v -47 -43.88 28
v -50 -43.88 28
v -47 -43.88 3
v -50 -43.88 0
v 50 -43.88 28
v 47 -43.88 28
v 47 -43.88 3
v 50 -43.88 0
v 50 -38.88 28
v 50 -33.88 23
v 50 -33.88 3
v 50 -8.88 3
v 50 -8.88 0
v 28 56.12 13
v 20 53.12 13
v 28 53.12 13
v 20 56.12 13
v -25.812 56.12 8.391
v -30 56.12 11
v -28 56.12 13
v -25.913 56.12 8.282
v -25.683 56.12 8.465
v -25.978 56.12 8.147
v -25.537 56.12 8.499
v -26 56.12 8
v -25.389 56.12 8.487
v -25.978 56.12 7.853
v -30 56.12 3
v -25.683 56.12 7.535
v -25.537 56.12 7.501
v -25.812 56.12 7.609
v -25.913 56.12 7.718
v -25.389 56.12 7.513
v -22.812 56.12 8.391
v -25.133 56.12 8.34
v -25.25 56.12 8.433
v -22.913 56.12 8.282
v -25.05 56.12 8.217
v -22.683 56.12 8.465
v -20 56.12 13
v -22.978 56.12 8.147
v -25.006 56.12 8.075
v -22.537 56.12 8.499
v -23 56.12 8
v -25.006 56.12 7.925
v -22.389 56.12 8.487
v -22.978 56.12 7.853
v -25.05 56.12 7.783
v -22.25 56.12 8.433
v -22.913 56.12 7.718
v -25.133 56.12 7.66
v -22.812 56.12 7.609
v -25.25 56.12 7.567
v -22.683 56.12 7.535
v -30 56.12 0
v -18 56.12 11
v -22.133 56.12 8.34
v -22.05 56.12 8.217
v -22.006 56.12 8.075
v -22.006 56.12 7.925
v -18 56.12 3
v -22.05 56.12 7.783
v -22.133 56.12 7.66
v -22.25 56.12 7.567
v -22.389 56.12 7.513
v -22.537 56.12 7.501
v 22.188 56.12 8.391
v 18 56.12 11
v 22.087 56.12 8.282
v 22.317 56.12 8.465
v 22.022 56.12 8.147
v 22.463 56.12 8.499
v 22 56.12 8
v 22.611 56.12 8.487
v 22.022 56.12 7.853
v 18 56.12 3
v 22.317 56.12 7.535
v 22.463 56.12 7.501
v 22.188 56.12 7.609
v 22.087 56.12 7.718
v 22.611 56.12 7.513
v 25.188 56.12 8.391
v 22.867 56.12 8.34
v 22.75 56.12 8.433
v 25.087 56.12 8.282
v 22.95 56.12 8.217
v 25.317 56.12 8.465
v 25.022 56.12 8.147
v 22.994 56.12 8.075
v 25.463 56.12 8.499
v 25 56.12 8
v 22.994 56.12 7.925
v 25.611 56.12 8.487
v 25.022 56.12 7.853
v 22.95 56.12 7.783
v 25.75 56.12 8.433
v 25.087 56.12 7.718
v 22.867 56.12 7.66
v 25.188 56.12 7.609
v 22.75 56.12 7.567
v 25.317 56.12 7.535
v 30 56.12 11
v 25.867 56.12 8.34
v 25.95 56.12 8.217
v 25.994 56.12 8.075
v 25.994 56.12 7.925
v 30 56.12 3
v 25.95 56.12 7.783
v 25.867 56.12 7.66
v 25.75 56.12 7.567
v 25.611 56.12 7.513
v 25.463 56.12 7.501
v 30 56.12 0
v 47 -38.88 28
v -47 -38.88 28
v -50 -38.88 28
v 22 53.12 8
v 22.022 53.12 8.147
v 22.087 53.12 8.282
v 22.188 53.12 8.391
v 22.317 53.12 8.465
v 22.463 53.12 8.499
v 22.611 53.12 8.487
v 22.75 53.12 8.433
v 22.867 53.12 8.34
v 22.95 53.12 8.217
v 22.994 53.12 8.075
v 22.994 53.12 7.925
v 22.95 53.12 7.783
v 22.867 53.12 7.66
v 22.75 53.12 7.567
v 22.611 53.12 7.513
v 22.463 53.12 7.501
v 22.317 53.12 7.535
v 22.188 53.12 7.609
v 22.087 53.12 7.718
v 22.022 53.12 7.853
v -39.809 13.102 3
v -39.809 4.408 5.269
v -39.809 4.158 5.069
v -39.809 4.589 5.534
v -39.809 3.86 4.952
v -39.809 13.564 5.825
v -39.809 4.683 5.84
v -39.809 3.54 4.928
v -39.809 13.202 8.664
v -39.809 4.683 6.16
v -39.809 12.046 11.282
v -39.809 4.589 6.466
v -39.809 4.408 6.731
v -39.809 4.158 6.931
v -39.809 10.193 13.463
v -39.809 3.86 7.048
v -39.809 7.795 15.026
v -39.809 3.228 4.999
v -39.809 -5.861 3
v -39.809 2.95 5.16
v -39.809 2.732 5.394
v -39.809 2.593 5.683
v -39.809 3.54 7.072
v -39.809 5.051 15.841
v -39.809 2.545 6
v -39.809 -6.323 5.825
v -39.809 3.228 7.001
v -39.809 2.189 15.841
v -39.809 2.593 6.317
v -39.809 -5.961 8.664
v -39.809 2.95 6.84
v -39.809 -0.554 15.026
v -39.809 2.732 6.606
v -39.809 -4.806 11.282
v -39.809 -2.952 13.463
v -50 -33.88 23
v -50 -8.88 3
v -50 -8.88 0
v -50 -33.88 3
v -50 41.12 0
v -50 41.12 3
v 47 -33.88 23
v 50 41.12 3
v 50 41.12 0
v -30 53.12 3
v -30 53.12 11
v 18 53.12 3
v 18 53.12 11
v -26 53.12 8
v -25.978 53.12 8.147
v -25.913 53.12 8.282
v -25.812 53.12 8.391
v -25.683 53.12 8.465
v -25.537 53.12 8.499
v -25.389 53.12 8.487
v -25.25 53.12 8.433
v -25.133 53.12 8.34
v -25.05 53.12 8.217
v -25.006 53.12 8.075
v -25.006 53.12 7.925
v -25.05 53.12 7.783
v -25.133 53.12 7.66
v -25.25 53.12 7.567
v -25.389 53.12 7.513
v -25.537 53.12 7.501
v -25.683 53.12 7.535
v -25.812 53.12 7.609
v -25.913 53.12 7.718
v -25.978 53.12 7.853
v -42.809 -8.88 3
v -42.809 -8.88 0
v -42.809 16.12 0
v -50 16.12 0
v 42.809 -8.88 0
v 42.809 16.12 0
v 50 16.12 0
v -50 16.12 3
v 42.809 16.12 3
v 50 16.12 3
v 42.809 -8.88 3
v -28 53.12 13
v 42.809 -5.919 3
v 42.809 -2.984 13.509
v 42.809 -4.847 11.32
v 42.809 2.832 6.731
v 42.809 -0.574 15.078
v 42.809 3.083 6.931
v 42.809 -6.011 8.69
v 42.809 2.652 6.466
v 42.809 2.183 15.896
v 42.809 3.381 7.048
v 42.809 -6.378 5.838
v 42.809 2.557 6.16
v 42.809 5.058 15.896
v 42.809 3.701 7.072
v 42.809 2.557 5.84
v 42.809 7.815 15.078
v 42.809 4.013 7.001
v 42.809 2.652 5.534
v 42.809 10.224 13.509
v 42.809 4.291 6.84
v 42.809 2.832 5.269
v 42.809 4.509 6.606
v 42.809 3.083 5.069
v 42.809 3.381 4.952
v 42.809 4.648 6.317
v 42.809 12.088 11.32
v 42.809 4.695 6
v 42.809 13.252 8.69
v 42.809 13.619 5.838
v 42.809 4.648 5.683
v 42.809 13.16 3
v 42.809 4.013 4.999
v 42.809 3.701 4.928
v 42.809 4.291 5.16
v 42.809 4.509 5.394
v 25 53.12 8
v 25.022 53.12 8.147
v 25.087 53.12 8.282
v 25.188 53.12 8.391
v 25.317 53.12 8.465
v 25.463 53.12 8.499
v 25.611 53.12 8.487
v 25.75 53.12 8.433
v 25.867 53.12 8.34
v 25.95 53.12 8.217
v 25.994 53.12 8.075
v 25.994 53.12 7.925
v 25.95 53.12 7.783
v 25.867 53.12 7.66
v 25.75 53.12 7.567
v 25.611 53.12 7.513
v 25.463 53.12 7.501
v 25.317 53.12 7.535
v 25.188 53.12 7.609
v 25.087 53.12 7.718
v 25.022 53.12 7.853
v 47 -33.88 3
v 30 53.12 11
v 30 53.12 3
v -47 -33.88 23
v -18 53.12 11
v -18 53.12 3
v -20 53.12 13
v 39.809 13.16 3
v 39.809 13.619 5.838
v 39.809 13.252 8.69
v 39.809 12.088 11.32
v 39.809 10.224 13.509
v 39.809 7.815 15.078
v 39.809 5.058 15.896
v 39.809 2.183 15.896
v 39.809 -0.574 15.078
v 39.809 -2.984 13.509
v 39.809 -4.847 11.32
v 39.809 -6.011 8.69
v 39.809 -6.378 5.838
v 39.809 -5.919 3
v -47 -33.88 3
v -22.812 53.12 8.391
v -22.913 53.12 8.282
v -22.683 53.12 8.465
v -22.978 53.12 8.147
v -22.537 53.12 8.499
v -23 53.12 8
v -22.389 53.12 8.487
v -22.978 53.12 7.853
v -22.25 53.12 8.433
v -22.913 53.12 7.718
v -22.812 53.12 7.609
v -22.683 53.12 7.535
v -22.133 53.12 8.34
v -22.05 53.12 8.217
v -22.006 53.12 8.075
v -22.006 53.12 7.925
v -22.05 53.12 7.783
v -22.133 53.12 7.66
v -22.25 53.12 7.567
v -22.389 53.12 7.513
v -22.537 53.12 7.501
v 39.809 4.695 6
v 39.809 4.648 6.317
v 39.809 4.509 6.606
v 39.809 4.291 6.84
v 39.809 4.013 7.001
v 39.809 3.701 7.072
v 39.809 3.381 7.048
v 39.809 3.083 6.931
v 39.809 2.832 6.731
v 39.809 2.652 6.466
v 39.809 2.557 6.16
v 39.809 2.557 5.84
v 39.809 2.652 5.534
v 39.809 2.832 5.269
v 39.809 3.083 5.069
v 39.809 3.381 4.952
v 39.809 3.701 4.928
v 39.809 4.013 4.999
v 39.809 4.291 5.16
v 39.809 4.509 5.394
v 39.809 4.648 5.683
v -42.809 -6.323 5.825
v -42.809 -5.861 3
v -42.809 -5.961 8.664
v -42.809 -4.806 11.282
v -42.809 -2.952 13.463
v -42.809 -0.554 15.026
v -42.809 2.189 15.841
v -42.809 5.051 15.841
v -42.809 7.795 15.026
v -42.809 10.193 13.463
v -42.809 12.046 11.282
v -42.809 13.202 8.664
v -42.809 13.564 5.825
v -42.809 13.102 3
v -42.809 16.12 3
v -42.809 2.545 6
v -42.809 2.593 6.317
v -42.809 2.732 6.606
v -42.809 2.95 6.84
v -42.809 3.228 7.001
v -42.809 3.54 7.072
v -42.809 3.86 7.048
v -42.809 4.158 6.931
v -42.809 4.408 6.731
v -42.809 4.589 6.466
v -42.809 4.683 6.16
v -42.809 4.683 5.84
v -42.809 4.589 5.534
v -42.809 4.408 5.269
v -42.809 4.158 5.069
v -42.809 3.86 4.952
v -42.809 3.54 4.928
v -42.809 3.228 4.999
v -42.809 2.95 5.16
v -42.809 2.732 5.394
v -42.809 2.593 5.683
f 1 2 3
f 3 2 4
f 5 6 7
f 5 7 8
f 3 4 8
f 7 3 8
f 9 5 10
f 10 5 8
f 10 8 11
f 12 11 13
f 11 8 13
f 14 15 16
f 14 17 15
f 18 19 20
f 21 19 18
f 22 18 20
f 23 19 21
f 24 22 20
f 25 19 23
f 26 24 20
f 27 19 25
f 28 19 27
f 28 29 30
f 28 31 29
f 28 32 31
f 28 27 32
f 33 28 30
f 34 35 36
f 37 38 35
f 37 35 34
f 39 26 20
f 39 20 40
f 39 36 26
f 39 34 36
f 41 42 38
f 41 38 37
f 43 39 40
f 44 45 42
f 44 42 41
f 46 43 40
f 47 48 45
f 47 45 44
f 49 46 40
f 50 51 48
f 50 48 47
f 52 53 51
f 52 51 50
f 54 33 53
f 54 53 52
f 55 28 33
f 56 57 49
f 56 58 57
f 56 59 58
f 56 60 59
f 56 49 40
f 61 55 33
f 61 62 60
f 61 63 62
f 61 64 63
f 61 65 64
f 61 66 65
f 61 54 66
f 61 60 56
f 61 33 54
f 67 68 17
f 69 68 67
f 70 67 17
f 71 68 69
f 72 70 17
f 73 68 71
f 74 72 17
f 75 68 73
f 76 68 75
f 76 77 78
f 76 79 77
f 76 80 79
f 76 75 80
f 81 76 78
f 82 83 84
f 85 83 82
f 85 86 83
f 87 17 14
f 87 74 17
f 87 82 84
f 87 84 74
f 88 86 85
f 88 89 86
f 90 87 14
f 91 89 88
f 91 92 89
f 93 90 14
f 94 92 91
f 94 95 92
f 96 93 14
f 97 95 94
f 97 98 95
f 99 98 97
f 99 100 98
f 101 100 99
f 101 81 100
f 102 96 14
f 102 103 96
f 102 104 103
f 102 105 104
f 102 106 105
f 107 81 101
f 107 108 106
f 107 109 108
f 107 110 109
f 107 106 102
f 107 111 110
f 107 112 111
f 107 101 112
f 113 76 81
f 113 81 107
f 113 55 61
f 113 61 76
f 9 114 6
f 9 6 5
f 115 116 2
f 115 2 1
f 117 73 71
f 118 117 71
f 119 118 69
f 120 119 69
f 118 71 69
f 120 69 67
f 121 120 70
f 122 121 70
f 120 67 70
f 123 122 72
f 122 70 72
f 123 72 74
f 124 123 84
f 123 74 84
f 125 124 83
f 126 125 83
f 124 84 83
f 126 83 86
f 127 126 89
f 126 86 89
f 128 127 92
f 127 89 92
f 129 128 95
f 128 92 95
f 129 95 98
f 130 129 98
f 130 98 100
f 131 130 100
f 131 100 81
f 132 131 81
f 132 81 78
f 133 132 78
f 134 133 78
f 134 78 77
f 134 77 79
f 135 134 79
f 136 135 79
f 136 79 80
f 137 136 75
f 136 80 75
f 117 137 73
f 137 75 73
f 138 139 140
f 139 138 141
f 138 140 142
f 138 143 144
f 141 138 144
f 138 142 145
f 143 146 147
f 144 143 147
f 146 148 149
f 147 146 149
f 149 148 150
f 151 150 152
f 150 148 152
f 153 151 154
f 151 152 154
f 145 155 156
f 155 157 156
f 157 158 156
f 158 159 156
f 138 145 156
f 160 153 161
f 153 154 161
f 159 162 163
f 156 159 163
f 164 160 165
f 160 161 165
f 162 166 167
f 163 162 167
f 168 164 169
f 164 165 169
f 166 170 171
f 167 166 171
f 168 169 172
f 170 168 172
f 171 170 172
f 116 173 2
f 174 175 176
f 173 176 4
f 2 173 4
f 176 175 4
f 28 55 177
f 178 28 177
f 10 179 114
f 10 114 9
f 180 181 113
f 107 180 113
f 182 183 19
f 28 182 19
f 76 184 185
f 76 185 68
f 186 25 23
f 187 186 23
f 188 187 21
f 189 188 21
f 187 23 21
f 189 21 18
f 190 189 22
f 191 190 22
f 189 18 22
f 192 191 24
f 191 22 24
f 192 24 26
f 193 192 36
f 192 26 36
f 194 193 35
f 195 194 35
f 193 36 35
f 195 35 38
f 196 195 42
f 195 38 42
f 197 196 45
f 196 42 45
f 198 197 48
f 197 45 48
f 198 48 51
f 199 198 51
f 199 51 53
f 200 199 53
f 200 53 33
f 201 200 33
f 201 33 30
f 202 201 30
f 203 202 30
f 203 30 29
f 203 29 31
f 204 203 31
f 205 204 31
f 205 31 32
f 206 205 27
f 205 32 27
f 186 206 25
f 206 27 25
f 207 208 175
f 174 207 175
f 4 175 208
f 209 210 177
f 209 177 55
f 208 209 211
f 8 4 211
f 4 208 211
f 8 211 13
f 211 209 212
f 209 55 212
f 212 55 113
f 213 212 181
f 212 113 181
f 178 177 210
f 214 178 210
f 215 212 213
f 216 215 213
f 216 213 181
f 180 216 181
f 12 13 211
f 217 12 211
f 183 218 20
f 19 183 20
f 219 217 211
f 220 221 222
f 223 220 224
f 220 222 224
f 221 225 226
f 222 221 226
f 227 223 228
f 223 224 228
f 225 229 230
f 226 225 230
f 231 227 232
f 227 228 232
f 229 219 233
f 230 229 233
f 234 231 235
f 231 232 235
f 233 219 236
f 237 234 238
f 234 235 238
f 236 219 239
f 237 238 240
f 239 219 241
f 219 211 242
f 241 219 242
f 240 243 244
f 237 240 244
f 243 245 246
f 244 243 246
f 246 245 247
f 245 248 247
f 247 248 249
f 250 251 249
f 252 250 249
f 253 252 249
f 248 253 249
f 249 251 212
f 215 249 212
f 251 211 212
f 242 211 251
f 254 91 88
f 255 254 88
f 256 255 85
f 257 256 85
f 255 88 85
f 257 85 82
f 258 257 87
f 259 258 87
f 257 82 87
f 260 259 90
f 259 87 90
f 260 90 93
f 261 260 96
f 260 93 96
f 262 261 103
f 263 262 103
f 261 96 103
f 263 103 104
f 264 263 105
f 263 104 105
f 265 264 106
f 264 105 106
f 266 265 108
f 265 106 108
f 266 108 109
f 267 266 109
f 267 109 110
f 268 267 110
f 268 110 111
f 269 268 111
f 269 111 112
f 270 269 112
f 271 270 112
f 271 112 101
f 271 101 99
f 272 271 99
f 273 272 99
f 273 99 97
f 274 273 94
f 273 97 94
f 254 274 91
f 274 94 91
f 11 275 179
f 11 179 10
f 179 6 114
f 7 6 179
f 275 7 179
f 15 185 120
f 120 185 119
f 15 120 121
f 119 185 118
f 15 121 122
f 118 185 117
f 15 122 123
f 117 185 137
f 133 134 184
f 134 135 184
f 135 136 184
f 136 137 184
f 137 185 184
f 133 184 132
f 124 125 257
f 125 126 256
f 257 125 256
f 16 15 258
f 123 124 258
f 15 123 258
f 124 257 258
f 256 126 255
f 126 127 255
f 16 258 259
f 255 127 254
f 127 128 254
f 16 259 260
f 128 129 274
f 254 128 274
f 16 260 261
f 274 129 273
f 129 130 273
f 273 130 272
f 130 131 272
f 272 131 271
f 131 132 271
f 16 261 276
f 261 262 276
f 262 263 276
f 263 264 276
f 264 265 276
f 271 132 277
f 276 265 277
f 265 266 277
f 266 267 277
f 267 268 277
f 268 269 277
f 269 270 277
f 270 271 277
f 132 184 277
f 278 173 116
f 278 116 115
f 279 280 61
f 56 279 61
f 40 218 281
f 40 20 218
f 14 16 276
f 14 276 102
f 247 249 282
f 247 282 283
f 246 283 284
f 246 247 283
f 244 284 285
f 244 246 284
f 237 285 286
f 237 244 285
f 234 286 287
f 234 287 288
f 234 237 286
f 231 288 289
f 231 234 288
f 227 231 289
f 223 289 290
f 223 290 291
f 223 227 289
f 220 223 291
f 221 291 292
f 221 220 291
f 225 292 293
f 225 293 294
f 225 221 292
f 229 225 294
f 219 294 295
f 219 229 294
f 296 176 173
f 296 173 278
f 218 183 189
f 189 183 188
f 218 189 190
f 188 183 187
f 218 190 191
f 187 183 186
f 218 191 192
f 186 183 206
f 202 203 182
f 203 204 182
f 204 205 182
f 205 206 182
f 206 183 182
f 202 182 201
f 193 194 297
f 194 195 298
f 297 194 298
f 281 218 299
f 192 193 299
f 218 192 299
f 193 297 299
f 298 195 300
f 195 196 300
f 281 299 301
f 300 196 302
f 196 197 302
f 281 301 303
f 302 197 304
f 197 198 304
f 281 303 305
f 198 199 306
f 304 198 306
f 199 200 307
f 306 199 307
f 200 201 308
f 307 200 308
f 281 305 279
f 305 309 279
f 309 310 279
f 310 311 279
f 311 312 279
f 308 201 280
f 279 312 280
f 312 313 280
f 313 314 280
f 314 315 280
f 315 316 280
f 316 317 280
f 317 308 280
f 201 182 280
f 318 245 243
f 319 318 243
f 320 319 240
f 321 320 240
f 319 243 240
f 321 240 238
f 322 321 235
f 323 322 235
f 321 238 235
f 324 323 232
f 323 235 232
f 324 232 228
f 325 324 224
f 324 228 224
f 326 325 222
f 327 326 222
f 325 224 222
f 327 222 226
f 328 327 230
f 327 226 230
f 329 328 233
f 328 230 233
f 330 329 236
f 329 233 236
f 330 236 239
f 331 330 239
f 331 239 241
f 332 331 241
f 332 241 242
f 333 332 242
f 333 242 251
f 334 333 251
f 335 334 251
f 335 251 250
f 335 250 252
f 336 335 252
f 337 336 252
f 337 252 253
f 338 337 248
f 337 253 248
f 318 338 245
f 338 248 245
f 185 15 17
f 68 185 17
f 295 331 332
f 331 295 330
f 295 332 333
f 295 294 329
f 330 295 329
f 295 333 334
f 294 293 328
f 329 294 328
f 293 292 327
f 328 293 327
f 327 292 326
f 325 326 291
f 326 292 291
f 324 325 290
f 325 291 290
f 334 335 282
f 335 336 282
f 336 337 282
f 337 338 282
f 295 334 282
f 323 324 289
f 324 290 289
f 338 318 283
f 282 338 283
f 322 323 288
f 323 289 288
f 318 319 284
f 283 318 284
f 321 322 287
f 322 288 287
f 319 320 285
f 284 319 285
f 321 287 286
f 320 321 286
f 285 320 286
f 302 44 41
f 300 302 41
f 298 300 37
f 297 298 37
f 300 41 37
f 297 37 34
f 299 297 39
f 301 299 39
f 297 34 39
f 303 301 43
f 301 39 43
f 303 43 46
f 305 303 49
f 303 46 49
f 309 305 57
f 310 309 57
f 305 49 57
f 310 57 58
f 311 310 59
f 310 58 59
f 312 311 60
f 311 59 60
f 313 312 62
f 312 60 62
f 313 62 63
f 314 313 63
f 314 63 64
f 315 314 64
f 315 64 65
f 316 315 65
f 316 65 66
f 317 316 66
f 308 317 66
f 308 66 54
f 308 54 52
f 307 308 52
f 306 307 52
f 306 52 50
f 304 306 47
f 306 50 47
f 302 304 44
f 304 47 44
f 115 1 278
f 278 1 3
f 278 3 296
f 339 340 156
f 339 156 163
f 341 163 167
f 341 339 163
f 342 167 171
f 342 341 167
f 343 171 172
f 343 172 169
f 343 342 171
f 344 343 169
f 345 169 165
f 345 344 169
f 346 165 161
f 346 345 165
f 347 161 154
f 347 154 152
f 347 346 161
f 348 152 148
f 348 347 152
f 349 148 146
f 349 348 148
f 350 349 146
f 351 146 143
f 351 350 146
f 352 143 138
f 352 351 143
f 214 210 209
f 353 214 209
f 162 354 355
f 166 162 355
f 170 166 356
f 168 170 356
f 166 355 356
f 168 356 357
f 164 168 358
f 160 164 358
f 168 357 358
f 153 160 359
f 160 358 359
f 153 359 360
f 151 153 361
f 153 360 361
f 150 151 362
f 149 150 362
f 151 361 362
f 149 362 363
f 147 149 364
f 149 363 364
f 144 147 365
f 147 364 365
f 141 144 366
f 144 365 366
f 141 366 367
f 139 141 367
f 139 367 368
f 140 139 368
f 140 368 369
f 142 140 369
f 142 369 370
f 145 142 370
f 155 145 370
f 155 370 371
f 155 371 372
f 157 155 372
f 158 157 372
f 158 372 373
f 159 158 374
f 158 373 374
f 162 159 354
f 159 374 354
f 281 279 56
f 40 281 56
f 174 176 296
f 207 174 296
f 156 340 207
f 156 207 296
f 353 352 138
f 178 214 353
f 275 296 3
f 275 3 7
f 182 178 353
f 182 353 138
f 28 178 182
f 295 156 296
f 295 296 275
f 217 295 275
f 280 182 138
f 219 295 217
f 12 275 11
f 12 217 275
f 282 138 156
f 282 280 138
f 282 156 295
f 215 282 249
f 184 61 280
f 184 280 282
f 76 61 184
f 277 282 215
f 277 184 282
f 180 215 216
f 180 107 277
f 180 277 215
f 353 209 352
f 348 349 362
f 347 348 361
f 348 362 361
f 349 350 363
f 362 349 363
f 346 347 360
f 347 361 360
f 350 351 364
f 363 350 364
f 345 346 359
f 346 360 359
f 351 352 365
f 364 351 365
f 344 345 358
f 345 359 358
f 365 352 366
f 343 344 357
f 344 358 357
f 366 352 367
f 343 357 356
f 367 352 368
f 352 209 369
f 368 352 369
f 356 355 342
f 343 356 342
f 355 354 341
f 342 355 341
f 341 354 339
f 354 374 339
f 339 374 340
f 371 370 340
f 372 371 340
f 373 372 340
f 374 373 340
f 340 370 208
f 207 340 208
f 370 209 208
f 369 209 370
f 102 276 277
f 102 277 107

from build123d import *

# Parameters (mm, degrees)
F1_DEPTH  = 3
F2_R      = 1.075
F3_DEPTH  = 3
F4_R      = 1.075
F5_DEPTH  = 3
F6_W      = 12
F6_H      = 3
F7_DEPTH  = 10
F8_R      = 0.5
F9_DEPTH  = 3
F10_SIZE  = 2
F11_W     = 3
F11_H     = 10
F12_DEPTH = 25
F13_SIZE  = 5


# Not quite as in the source:
# - a feature names something its author has since deleted; it is built from what else it names


with BuildPart() as f1:
    # F0 (on Top) → F1 (new body)
    with BuildSketch(Plane.XY):
        Polygon((30, 56.1203770339), (-30, 56.1203770339), (-50, 41.1203770339), (-50, 16.1203770339), (-42.8093671799, 16.1203770339), (-42.8093671799, -8.8796229661), (-50, -8.8796229661), (-50, -43.8796229661), (50, -43.8796229661), (50, -8.8796229661), (42.8093671799, -8.8796229661), (42.8093671799, 16.1203770339), (50, 16.1203770339), (50, 41.1203770339), align=None)
    extrude(amount=F1_DEPTH)

    # F2 (on face) → F3 (join)
    with BuildSketch(Plane.YZ.offset(42.8093671799)):
        with BuildLine():
            Line((-5.9190149802, 3), (13.1597690481, 3))
            ThreePointArc((13.1597690481, 3), (3.6203770339, 16), (-5.9190149802, 3))
        make_face()
        with Locations((3.6203770339, 6)):
            Circle(F2_R, mode=Mode.SUBTRACT)
    extrude(amount=-F3_DEPTH)

    # F4 (on face) → F5 (join)
    with BuildSketch(Plane(origin=(-42.8093671799, 0, 0), x_dir=(0, -1, 0), z_dir=(-1, 0, 0))):
        with BuildLine():
            Line((-13.1019409746, 3), (5.8611869067, 3))
            ThreePointArc((5.8611869067, 3), (-3.6203770339, 15.9448506656), (-13.1019409746, 3))
        make_face()
        with Locations((-3.6203770339, 6)):
            Circle(F4_R, mode=Mode.SUBTRACT)
    extrude(amount=-F5_DEPTH)

    # F6 (on face) → F7 (join)
    with BuildSketch(Plane.XY.offset(3)):
        with Locations((-24, 54.6203770339)):
            Rectangle(F6_W, F6_H)
        with Locations((24, 54.6203770339)):
            Rectangle(F6_W, F6_H)
    extrude(amount=F7_DEPTH)

    # F8 (on face) → F9 (cut, through all)
    with BuildSketch(Plane(origin=(0, 56.1203770339, 0), x_dir=(-1, 0, 0), z_dir=(0, 1, 0))):
        with Locations((-25.5, 8)):
            Circle(F8_R)
        with Locations((-22.5, 8)):
            Circle(F8_R)
        with Locations((25.5, 8)):
            Circle(F8_R)
        with Locations((22.5, 8)):
            Circle(F8_R)
    extrude(amount=-F9_DEPTH, mode=Mode.SUBTRACT)

    # F10
    f10_edges = [f1.edges().sort_by_distance(p)[0] for p in [
        (18, 54.620377, 13),
        (30, 54.620377, 13),
        (-18, 54.620377, 13),
        (-30, 54.620377, 13),
    ]]
    chamfer(f10_edges, length=F10_SIZE)

    # F11 (on face) → F12 (join)
    with BuildSketch(Plane.XY.offset(3)):
        with Locations((48.5, -38.8796229661)):
            Rectangle(F11_W, F11_H)
        with Locations((-48.5, -38.8796229661)):
            Rectangle(F11_W, F11_H)
    extrude(amount=F12_DEPTH)

    # F13
    f13_edges = [f1.edges().sort_by_distance(p)[0] for p in [
        (-48.5, -33.879623, 28),
        (48.5, -33.879623, 28),
    ]]
    chamfer(f13_edges, length=F13_SIZE)


solid = f1.part
